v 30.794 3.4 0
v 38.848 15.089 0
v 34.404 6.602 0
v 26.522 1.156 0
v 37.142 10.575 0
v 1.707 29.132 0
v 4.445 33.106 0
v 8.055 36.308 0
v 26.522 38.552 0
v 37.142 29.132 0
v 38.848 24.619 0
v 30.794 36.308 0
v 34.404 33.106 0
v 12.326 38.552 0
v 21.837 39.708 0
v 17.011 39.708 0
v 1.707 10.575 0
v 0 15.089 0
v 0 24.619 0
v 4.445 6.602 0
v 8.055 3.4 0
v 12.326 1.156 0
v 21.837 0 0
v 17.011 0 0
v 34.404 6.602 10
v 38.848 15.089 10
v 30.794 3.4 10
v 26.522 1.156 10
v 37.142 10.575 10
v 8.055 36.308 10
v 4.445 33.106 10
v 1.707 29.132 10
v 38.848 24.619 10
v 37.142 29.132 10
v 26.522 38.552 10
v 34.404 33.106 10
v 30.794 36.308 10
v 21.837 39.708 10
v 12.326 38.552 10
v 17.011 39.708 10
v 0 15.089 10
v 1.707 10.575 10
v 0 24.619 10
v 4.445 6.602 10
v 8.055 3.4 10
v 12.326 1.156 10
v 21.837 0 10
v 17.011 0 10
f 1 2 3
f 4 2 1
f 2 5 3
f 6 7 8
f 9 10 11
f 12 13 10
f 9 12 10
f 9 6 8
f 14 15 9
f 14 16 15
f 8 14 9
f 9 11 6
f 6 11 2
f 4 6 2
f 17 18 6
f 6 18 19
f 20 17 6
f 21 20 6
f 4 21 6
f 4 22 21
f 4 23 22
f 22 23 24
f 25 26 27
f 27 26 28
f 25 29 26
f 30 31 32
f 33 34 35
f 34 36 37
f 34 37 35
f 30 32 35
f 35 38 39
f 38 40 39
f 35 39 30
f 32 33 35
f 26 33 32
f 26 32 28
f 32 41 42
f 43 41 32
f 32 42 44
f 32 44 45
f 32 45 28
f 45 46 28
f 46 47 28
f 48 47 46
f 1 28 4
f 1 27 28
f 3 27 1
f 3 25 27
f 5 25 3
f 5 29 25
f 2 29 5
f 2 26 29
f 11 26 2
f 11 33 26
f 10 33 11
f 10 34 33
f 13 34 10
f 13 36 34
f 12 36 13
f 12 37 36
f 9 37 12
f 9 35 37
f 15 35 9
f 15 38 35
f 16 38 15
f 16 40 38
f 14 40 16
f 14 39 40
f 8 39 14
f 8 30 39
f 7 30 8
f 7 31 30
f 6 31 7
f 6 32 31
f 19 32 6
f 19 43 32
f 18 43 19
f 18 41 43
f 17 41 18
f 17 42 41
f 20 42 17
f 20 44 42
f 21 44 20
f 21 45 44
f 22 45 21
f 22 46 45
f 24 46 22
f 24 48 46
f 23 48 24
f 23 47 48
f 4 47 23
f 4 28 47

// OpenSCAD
$fn = 32;

// ----------------------------------------------------------------------
// Flat adaptor: double_d, 10 mm thick
// ----------------------------------------------------------------------

// --- parameters (mm) ---
profile_height = 10;      // extrusion height
profile_points = 24;      // points of the closed outline

profile = [[38.848, 24.619], [37.142, 29.132], [34.404, 33.106], [30.794, 36.308], [26.522, 38.552], [21.837, 39.708], [17.011, 39.708], [12.326, 38.552], [8.055, 36.308], [4.445, 33.106], [1.707, 29.132], [0, 24.619], [0, 15.089], [1.707, 10.575], [4.445, 6.602], [8.055, 3.4], [12.326, 1.156], [17.011, 0], [21.837, 0], [26.522, 1.156], [30.794, 3.4], [34.404, 6.602], [37.142, 10.575], [38.848, 15.089]];  // single closed polygon, 24 points, counter clockwise

// --- the one profile operation ---
linear_extrude(height = profile_height) polygon(points = profile);
